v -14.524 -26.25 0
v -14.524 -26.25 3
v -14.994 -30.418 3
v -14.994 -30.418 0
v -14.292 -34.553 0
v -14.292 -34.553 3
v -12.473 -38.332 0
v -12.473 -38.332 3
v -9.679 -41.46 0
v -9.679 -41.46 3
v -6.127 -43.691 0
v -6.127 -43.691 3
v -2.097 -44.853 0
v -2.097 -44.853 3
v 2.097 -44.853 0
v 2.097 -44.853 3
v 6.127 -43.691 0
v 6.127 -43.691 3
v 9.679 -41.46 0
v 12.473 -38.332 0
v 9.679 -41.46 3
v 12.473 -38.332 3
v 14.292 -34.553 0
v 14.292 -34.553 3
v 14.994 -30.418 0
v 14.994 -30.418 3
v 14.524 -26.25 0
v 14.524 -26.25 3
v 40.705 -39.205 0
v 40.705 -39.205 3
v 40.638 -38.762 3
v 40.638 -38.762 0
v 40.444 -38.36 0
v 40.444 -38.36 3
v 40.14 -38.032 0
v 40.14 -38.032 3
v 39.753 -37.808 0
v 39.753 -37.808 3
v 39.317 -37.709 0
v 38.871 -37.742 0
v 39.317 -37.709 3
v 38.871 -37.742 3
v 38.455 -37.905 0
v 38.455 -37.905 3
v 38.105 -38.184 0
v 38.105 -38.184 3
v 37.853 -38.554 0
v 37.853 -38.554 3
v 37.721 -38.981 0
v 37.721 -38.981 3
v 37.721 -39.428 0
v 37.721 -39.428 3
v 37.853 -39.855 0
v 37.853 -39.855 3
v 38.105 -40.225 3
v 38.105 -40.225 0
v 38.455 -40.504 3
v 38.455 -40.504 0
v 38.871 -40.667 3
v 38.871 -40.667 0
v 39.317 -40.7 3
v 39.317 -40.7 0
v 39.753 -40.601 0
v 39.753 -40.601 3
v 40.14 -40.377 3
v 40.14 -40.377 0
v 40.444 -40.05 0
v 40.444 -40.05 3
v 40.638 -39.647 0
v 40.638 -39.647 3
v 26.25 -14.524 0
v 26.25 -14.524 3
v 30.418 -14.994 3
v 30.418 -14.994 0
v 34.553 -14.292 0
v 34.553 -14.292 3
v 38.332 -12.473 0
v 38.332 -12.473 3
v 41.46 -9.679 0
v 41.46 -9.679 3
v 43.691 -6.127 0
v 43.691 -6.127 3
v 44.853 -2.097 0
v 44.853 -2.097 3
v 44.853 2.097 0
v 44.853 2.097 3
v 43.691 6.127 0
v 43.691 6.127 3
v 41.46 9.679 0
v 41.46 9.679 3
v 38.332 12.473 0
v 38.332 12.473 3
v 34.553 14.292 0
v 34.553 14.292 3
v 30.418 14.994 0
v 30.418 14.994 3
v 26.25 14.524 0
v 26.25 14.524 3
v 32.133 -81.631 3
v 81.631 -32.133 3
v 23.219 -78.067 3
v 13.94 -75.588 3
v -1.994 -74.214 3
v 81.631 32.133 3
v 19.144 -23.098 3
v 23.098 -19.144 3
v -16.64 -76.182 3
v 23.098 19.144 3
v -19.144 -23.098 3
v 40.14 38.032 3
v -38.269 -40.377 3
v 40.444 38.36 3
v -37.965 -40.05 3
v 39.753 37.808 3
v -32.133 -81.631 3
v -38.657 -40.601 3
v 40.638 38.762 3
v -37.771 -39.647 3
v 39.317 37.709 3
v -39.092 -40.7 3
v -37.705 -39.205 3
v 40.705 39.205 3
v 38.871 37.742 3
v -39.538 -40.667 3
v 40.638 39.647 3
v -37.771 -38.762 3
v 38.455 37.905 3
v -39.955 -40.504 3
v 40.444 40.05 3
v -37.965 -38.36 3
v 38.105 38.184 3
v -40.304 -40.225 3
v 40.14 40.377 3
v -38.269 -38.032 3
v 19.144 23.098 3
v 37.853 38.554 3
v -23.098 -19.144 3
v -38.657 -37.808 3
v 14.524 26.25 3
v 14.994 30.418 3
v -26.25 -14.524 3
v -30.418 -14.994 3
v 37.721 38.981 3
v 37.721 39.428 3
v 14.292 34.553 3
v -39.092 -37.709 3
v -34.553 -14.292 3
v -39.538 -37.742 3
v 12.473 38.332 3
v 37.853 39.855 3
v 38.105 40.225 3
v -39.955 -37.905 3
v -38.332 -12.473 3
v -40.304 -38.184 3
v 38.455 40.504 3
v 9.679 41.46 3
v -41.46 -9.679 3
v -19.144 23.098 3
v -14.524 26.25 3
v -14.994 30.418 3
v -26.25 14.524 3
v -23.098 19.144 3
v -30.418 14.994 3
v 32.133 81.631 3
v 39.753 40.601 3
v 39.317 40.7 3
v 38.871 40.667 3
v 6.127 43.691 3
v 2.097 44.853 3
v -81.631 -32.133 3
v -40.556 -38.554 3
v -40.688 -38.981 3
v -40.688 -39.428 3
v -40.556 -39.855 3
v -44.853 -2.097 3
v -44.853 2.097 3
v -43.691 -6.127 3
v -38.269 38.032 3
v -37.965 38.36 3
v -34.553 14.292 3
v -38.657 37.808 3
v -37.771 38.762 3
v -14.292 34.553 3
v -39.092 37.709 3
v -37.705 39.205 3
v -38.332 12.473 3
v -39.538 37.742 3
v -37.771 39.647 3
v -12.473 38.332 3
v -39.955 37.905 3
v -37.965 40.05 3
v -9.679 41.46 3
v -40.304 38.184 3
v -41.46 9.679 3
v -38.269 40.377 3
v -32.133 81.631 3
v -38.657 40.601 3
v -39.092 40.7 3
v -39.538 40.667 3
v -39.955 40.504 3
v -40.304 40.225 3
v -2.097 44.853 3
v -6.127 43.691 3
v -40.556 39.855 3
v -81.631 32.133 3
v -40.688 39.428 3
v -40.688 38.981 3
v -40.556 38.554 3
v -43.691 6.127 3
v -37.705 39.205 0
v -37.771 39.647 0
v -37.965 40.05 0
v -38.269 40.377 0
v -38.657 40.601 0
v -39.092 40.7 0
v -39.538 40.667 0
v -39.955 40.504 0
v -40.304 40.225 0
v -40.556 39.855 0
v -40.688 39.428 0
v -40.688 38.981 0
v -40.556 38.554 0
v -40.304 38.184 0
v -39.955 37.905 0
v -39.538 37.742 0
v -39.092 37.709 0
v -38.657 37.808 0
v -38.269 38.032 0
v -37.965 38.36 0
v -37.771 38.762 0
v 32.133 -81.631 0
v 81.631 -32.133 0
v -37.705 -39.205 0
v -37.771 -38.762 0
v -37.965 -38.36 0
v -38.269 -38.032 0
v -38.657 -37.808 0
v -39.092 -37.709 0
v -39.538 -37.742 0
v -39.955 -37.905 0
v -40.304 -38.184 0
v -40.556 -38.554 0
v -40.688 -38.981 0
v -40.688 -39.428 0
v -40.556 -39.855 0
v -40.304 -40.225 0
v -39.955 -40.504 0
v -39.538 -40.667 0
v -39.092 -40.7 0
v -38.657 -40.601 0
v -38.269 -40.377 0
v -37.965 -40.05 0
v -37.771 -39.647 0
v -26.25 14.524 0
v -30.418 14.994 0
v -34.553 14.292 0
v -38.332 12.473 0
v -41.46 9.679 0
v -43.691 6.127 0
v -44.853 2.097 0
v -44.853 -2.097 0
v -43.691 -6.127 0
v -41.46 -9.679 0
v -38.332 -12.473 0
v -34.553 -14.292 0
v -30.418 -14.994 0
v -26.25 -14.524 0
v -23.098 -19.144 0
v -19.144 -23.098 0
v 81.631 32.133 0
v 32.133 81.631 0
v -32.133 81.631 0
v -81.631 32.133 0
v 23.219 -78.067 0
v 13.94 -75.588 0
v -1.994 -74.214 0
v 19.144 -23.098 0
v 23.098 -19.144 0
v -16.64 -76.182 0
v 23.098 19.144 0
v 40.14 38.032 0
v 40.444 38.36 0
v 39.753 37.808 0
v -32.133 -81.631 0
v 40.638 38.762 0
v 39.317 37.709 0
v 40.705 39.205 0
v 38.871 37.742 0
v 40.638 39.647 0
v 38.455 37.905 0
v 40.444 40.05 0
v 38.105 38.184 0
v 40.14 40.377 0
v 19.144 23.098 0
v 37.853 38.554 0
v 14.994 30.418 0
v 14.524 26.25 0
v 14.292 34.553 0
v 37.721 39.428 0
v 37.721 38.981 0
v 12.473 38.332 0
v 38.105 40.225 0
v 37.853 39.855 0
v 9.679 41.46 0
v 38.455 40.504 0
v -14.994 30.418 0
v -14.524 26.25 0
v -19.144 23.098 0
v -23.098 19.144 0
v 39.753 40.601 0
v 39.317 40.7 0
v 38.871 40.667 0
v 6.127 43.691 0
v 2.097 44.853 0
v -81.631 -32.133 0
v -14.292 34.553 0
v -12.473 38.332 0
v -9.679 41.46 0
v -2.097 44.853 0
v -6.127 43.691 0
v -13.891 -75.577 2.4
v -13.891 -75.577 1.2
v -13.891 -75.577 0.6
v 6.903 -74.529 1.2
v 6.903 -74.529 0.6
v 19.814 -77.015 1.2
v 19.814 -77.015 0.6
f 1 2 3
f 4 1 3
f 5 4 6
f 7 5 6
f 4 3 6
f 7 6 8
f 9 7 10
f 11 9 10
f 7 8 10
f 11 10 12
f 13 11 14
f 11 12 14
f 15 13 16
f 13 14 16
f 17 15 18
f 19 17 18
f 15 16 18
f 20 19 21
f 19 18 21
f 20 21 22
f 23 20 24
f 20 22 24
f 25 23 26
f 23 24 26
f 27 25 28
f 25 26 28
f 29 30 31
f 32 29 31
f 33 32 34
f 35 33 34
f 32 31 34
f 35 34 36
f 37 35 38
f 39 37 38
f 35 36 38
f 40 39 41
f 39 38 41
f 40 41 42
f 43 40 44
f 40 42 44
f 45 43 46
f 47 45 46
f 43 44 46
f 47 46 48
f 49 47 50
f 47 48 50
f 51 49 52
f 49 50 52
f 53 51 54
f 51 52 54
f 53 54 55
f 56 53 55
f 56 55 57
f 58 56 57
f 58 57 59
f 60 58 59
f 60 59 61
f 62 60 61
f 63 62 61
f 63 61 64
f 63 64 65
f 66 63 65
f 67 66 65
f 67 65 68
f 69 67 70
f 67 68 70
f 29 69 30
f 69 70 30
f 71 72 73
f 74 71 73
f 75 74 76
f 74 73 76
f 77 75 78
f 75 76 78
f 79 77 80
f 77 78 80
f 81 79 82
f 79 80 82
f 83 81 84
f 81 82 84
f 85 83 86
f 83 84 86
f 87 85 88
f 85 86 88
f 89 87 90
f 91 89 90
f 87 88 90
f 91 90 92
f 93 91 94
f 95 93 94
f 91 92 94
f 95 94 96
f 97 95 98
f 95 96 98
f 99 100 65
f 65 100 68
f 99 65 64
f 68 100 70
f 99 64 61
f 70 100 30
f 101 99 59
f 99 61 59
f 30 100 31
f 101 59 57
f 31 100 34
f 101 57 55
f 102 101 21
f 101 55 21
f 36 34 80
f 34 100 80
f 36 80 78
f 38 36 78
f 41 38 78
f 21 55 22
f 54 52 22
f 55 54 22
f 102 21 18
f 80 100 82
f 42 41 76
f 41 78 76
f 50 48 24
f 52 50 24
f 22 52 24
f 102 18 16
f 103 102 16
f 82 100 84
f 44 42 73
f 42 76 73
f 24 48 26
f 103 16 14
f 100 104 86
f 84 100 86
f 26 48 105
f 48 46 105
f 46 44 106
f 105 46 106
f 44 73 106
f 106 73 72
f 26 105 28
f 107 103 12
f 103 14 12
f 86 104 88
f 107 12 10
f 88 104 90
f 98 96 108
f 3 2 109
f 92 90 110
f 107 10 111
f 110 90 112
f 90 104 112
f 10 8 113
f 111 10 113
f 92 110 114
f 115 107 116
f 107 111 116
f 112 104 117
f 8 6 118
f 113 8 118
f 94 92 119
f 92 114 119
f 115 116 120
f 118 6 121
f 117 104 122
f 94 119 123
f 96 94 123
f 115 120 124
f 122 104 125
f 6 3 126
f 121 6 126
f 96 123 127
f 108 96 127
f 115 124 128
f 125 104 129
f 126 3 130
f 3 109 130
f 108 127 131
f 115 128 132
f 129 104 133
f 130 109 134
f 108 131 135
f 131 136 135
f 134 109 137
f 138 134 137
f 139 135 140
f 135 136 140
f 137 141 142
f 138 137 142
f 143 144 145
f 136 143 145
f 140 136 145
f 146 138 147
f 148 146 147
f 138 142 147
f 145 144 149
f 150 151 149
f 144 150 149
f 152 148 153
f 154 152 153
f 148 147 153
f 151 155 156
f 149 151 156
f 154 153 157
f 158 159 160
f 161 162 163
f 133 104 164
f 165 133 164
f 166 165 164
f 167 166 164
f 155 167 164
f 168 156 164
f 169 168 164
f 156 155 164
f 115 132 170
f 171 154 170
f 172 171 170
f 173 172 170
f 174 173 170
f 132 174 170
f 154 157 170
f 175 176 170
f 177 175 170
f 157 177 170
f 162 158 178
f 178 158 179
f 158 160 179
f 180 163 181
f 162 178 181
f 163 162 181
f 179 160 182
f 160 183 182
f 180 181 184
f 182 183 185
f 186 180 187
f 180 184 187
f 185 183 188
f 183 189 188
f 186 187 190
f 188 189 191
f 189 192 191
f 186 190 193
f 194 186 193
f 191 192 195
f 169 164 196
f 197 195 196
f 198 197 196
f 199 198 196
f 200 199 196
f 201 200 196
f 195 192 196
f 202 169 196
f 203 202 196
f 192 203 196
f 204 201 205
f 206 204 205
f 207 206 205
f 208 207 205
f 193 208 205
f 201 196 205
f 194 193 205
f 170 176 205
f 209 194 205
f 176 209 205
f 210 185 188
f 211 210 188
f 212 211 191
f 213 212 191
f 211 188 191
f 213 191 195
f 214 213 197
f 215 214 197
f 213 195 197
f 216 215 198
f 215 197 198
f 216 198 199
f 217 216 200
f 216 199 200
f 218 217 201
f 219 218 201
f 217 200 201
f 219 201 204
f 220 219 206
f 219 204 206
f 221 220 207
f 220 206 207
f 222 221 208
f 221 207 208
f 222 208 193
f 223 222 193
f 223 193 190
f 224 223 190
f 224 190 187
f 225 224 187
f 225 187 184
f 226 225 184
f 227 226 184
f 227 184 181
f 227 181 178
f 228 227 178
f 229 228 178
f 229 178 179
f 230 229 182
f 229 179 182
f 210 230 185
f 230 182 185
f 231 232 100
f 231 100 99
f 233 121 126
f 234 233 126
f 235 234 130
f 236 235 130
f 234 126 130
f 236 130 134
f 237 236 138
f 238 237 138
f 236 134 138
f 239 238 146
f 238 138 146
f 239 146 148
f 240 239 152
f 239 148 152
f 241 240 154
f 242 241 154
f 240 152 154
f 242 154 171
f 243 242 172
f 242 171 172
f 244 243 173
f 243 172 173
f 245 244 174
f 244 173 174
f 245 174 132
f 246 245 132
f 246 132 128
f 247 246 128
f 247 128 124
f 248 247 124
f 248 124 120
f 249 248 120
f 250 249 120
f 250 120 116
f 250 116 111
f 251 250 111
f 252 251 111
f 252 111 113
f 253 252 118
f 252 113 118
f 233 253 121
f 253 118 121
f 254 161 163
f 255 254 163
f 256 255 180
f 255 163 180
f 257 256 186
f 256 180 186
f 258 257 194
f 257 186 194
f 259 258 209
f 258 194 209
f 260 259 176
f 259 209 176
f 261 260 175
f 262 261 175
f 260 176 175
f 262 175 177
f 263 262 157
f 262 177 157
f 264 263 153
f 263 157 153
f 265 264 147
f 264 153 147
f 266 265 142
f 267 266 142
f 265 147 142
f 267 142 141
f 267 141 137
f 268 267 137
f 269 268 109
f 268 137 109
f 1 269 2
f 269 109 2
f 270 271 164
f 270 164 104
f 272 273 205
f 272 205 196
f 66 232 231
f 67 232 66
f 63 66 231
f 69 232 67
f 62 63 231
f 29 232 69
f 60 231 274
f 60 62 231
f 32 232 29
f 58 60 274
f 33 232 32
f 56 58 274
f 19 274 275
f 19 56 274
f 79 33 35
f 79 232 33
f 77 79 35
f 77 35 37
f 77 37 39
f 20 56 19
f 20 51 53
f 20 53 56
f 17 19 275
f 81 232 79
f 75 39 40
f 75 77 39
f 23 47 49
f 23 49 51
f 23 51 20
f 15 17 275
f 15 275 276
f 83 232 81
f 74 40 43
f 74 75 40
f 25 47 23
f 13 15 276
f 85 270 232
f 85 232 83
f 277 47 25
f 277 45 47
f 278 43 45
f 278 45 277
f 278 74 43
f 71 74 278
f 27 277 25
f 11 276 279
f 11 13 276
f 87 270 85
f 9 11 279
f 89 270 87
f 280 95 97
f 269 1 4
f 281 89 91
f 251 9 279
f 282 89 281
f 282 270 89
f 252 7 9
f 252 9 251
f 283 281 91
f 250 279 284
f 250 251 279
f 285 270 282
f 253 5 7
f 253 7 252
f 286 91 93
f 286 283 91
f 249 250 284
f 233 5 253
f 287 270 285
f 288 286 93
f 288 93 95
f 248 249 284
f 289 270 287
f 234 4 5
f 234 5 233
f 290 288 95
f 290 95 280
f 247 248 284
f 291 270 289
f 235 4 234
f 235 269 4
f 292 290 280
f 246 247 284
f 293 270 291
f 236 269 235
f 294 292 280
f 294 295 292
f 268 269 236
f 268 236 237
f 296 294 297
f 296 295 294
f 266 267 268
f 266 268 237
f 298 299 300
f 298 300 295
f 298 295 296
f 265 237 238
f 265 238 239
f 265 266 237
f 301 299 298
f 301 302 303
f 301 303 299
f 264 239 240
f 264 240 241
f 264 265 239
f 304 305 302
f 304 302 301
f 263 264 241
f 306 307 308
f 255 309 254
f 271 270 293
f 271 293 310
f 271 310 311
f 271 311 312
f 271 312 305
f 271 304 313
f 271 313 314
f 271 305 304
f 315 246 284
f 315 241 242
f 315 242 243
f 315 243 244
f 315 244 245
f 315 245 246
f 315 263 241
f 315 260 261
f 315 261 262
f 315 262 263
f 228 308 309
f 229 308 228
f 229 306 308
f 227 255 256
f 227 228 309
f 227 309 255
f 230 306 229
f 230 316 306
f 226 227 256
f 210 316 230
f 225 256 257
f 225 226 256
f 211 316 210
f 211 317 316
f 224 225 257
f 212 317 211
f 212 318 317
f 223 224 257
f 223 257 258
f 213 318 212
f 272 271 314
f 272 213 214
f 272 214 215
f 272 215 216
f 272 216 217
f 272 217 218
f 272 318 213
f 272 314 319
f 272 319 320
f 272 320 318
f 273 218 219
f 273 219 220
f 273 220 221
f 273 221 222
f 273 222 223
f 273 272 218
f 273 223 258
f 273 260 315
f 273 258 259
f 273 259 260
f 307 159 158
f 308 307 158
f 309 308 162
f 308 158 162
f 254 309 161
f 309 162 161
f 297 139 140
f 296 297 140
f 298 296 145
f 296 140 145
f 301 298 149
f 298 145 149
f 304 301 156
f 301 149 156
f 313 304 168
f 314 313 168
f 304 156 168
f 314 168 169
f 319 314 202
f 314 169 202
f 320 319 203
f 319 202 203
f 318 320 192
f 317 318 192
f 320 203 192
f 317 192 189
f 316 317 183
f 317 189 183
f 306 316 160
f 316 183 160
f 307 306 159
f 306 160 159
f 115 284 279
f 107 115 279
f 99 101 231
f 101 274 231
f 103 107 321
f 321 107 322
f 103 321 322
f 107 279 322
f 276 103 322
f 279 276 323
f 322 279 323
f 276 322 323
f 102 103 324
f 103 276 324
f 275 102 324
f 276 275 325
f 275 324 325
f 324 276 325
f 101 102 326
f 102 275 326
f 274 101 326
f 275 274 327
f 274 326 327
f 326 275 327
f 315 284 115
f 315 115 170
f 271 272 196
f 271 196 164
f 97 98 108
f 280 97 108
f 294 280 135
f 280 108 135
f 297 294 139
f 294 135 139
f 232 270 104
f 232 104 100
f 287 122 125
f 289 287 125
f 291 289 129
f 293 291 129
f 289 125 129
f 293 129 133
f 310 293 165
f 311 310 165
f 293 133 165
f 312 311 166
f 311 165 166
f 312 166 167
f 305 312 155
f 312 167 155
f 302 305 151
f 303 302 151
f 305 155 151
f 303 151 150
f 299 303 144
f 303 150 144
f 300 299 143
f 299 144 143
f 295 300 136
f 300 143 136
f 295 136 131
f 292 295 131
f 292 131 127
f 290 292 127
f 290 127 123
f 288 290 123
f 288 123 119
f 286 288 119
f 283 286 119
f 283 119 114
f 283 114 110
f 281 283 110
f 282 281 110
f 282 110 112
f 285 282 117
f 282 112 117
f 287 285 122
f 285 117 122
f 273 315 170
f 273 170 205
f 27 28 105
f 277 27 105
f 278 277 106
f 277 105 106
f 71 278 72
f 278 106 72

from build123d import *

# Parameters (mm, degrees)
BOSS_EXTRUDE1_DEPTH = 3
SKETCH2_R           = 1.5
CUT_EXTRUDE1_DEPTH  = 3
SKETCH3_R           = 30
SKETCH3_R_2         = 15
CUT_EXTRUDE2_DEPTH  = 3


with BuildPart() as part:
    # Sketch1 → Boss-Extrude1 (new body)
    with BuildSketch(Plane.XY):
        with BuildLine():
            Line((-32.133468612, 81.630943295), (32.133468612, 81.630943295))
            Line((32.133468612, 81.630943295), (81.630943295, 32.133468612))
            Line((81.630943295, 32.133468612), (81.630943295, -32.133468612))
            Line((81.630943295, -32.133468612), (32.133468612, -81.630943295))
            add(Edge.make_bspline(
                [(-32.133468612, -81.630943295), (-26.315604905, -78.929469601), (-17.458466972, -75.90692924), (-6.459846686, -74.366971031), (0.503945588, -74.095540146), (13.381410653, -74.737409183), (24.194527132, -77.919288079), (32.133468612, -81.630943295)],
                knots=[0, 0, 0, 0, 0.289771888, 0.418866631, 0.500125988, 0.604148798, 1, 1, 1, 1], degree=3))
            Line((-32.133468612, -81.630943295), (-81.630943295, -32.133468612))
            Line((-81.630943295, -32.133468612), (-81.630943295, 32.133468612))
            Line((-81.630943295, 32.133468612), (-32.133468612, 81.630943295))
        make_face()
    extrude(amount=BOSS_EXTRUDE1_DEPTH)

    # Sketch2 → Cut-Extrude1 (cut)
    with BuildSketch(Plane.XY.offset(3)):
        with Locations((-39.204536424, -39.204536424)):
            Circle(SKETCH2_R)
        with Locations((39.204536424, -39.204536424)):
            Circle(SKETCH2_R)
        with Locations((39.204536424, 39.204536424)):
            Circle(SKETCH2_R)
        with Locations((-39.204536424, 39.204536424)):
            Circle(SKETCH2_R)
    extrude(amount=-CUT_EXTRUDE1_DEPTH, mode=Mode.SUBTRACT)

    # Sketch3 → Cut-Extrude2 (cut)
    with BuildSketch(Plane.XY.offset(3)):
        Circle(SKETCH3_R)
        with Locations((0, 30)):
            Circle(SKETCH3_R_2)
        with Locations((0, -30)):
            Circle(SKETCH3_R_2)
        with Locations((30, 0)):
            Circle(SKETCH3_R_2)
        with Locations((-30, 0)):
            Circle(SKETCH3_R_2)
    extrude(amount=-CUT_EXTRUDE2_DEPTH, mode=Mode.SUBTRACT)


solid = part.part
